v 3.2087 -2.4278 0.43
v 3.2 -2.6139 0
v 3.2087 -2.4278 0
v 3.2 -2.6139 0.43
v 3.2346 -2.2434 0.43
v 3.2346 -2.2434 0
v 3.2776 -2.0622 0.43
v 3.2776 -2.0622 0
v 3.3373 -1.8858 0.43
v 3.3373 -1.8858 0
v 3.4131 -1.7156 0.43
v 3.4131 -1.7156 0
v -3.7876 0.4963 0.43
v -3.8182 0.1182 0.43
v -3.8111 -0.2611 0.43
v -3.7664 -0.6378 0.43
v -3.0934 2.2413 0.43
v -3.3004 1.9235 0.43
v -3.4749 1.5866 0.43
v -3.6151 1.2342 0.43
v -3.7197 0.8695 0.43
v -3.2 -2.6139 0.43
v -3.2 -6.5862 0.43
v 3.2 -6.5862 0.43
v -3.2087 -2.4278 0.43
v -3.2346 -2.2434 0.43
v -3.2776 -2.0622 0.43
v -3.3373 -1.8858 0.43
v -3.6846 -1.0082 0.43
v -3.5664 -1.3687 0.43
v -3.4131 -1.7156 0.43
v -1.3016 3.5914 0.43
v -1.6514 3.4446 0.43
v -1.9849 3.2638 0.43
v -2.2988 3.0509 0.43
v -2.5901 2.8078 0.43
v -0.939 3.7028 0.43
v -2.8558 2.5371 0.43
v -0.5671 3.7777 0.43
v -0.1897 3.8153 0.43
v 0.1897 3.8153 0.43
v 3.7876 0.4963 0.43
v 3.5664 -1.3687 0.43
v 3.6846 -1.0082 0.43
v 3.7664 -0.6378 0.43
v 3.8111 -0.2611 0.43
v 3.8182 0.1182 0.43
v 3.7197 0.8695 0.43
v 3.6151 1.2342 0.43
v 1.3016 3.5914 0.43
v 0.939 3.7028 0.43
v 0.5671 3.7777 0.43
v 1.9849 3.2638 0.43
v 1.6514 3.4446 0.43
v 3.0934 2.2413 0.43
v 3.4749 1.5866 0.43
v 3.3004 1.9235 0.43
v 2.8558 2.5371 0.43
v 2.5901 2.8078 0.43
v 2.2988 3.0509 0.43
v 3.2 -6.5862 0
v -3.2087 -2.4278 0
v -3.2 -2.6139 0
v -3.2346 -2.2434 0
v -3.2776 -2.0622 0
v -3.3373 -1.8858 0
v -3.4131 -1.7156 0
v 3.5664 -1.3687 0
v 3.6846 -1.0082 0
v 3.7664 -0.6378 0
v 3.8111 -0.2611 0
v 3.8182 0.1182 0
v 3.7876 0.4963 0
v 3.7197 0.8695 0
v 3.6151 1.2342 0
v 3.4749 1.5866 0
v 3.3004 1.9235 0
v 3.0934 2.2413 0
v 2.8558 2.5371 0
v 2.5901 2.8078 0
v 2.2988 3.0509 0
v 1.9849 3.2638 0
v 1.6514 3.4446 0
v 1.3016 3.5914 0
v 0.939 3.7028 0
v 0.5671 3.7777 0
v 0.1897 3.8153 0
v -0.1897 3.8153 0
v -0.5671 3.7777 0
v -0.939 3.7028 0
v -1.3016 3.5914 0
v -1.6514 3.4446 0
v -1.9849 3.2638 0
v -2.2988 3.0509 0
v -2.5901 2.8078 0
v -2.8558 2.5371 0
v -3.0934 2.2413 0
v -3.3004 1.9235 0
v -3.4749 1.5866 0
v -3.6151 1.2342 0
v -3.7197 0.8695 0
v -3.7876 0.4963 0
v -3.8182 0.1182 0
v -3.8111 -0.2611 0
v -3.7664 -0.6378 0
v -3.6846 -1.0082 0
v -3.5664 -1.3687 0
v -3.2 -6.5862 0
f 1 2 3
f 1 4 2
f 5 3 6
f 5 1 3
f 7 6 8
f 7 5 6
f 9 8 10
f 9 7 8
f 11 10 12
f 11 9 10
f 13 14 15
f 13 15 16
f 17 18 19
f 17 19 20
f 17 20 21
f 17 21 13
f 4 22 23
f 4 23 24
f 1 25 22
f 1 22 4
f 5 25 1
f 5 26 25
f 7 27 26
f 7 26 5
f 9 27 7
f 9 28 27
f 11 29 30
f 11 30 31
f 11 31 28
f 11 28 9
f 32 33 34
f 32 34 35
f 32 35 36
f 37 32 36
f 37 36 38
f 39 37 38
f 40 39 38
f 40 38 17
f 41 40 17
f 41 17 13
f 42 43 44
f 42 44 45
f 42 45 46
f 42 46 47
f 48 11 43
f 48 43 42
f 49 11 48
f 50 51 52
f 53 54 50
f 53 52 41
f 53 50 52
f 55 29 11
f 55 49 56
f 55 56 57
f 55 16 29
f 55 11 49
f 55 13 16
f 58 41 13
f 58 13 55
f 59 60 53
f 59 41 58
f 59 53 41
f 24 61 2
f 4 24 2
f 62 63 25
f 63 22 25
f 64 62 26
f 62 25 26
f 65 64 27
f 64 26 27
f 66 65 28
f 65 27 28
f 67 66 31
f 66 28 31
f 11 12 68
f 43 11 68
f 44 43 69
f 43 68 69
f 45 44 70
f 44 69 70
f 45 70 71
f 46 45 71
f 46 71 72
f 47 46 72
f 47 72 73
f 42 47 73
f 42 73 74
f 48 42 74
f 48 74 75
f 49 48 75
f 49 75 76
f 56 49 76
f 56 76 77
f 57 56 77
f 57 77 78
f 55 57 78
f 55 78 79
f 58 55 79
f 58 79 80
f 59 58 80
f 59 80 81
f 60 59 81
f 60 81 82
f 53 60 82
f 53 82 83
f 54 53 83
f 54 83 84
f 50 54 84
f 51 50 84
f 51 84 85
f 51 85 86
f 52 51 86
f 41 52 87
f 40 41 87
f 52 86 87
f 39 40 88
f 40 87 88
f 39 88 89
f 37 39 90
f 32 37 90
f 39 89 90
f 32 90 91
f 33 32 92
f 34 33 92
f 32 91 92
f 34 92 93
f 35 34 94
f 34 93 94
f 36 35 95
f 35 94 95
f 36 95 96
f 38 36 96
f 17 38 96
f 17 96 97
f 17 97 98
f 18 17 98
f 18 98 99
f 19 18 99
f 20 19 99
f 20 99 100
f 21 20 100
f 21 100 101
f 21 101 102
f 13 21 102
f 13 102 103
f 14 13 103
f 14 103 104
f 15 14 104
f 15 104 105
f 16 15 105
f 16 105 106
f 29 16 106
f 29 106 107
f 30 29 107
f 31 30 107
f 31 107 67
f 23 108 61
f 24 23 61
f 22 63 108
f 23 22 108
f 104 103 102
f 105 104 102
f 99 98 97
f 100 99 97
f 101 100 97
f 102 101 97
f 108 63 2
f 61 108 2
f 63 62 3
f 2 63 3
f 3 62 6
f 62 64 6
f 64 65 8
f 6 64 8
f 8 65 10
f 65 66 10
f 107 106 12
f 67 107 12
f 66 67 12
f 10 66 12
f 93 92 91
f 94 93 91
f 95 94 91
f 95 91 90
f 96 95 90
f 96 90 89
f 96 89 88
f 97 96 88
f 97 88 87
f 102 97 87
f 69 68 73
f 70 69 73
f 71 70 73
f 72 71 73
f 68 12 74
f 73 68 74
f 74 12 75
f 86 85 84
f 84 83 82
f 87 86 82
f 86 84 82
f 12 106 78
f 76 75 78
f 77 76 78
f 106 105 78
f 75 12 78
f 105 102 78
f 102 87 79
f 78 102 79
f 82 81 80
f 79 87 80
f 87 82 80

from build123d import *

# Parameters (mm, degrees)
SKETCH1_R           = 3.82
BOSS_EXTRUDE1_DEPTH = 0.43
FILLET1_R           = 2


with BuildPart() as part:
    # Sketch1 → Boss-Extrude1 (new body)
    with BuildSketch(Plane.XY):
        Circle(SKETCH1_R)
        with BuildLine():
            Line((-3.2, -2.086240638), (-3.2, -6.586240638))
            Line((-3.2, -6.586240638), (3.2, -6.586240638))
            Line((3.2, -6.586240638), (3.2, -2.086240638))
            ThreePointArc((3.2, -2.086240638), (0, -3.82), (-3.2, -2.086240638))
        make_face()
    extrude(amount=BOSS_EXTRUDE1_DEPTH)

    # Fillet1
    fillet1_edges = [part.edges().sort_by_distance(p)[0] for p in [
        (3.2, -2.086240638, 0.215),
        (-3.2, -2.086240638, 0.215),
    ]]
    fillet(fillet1_edges, radius=FILLET1_R)


solid = part.part
